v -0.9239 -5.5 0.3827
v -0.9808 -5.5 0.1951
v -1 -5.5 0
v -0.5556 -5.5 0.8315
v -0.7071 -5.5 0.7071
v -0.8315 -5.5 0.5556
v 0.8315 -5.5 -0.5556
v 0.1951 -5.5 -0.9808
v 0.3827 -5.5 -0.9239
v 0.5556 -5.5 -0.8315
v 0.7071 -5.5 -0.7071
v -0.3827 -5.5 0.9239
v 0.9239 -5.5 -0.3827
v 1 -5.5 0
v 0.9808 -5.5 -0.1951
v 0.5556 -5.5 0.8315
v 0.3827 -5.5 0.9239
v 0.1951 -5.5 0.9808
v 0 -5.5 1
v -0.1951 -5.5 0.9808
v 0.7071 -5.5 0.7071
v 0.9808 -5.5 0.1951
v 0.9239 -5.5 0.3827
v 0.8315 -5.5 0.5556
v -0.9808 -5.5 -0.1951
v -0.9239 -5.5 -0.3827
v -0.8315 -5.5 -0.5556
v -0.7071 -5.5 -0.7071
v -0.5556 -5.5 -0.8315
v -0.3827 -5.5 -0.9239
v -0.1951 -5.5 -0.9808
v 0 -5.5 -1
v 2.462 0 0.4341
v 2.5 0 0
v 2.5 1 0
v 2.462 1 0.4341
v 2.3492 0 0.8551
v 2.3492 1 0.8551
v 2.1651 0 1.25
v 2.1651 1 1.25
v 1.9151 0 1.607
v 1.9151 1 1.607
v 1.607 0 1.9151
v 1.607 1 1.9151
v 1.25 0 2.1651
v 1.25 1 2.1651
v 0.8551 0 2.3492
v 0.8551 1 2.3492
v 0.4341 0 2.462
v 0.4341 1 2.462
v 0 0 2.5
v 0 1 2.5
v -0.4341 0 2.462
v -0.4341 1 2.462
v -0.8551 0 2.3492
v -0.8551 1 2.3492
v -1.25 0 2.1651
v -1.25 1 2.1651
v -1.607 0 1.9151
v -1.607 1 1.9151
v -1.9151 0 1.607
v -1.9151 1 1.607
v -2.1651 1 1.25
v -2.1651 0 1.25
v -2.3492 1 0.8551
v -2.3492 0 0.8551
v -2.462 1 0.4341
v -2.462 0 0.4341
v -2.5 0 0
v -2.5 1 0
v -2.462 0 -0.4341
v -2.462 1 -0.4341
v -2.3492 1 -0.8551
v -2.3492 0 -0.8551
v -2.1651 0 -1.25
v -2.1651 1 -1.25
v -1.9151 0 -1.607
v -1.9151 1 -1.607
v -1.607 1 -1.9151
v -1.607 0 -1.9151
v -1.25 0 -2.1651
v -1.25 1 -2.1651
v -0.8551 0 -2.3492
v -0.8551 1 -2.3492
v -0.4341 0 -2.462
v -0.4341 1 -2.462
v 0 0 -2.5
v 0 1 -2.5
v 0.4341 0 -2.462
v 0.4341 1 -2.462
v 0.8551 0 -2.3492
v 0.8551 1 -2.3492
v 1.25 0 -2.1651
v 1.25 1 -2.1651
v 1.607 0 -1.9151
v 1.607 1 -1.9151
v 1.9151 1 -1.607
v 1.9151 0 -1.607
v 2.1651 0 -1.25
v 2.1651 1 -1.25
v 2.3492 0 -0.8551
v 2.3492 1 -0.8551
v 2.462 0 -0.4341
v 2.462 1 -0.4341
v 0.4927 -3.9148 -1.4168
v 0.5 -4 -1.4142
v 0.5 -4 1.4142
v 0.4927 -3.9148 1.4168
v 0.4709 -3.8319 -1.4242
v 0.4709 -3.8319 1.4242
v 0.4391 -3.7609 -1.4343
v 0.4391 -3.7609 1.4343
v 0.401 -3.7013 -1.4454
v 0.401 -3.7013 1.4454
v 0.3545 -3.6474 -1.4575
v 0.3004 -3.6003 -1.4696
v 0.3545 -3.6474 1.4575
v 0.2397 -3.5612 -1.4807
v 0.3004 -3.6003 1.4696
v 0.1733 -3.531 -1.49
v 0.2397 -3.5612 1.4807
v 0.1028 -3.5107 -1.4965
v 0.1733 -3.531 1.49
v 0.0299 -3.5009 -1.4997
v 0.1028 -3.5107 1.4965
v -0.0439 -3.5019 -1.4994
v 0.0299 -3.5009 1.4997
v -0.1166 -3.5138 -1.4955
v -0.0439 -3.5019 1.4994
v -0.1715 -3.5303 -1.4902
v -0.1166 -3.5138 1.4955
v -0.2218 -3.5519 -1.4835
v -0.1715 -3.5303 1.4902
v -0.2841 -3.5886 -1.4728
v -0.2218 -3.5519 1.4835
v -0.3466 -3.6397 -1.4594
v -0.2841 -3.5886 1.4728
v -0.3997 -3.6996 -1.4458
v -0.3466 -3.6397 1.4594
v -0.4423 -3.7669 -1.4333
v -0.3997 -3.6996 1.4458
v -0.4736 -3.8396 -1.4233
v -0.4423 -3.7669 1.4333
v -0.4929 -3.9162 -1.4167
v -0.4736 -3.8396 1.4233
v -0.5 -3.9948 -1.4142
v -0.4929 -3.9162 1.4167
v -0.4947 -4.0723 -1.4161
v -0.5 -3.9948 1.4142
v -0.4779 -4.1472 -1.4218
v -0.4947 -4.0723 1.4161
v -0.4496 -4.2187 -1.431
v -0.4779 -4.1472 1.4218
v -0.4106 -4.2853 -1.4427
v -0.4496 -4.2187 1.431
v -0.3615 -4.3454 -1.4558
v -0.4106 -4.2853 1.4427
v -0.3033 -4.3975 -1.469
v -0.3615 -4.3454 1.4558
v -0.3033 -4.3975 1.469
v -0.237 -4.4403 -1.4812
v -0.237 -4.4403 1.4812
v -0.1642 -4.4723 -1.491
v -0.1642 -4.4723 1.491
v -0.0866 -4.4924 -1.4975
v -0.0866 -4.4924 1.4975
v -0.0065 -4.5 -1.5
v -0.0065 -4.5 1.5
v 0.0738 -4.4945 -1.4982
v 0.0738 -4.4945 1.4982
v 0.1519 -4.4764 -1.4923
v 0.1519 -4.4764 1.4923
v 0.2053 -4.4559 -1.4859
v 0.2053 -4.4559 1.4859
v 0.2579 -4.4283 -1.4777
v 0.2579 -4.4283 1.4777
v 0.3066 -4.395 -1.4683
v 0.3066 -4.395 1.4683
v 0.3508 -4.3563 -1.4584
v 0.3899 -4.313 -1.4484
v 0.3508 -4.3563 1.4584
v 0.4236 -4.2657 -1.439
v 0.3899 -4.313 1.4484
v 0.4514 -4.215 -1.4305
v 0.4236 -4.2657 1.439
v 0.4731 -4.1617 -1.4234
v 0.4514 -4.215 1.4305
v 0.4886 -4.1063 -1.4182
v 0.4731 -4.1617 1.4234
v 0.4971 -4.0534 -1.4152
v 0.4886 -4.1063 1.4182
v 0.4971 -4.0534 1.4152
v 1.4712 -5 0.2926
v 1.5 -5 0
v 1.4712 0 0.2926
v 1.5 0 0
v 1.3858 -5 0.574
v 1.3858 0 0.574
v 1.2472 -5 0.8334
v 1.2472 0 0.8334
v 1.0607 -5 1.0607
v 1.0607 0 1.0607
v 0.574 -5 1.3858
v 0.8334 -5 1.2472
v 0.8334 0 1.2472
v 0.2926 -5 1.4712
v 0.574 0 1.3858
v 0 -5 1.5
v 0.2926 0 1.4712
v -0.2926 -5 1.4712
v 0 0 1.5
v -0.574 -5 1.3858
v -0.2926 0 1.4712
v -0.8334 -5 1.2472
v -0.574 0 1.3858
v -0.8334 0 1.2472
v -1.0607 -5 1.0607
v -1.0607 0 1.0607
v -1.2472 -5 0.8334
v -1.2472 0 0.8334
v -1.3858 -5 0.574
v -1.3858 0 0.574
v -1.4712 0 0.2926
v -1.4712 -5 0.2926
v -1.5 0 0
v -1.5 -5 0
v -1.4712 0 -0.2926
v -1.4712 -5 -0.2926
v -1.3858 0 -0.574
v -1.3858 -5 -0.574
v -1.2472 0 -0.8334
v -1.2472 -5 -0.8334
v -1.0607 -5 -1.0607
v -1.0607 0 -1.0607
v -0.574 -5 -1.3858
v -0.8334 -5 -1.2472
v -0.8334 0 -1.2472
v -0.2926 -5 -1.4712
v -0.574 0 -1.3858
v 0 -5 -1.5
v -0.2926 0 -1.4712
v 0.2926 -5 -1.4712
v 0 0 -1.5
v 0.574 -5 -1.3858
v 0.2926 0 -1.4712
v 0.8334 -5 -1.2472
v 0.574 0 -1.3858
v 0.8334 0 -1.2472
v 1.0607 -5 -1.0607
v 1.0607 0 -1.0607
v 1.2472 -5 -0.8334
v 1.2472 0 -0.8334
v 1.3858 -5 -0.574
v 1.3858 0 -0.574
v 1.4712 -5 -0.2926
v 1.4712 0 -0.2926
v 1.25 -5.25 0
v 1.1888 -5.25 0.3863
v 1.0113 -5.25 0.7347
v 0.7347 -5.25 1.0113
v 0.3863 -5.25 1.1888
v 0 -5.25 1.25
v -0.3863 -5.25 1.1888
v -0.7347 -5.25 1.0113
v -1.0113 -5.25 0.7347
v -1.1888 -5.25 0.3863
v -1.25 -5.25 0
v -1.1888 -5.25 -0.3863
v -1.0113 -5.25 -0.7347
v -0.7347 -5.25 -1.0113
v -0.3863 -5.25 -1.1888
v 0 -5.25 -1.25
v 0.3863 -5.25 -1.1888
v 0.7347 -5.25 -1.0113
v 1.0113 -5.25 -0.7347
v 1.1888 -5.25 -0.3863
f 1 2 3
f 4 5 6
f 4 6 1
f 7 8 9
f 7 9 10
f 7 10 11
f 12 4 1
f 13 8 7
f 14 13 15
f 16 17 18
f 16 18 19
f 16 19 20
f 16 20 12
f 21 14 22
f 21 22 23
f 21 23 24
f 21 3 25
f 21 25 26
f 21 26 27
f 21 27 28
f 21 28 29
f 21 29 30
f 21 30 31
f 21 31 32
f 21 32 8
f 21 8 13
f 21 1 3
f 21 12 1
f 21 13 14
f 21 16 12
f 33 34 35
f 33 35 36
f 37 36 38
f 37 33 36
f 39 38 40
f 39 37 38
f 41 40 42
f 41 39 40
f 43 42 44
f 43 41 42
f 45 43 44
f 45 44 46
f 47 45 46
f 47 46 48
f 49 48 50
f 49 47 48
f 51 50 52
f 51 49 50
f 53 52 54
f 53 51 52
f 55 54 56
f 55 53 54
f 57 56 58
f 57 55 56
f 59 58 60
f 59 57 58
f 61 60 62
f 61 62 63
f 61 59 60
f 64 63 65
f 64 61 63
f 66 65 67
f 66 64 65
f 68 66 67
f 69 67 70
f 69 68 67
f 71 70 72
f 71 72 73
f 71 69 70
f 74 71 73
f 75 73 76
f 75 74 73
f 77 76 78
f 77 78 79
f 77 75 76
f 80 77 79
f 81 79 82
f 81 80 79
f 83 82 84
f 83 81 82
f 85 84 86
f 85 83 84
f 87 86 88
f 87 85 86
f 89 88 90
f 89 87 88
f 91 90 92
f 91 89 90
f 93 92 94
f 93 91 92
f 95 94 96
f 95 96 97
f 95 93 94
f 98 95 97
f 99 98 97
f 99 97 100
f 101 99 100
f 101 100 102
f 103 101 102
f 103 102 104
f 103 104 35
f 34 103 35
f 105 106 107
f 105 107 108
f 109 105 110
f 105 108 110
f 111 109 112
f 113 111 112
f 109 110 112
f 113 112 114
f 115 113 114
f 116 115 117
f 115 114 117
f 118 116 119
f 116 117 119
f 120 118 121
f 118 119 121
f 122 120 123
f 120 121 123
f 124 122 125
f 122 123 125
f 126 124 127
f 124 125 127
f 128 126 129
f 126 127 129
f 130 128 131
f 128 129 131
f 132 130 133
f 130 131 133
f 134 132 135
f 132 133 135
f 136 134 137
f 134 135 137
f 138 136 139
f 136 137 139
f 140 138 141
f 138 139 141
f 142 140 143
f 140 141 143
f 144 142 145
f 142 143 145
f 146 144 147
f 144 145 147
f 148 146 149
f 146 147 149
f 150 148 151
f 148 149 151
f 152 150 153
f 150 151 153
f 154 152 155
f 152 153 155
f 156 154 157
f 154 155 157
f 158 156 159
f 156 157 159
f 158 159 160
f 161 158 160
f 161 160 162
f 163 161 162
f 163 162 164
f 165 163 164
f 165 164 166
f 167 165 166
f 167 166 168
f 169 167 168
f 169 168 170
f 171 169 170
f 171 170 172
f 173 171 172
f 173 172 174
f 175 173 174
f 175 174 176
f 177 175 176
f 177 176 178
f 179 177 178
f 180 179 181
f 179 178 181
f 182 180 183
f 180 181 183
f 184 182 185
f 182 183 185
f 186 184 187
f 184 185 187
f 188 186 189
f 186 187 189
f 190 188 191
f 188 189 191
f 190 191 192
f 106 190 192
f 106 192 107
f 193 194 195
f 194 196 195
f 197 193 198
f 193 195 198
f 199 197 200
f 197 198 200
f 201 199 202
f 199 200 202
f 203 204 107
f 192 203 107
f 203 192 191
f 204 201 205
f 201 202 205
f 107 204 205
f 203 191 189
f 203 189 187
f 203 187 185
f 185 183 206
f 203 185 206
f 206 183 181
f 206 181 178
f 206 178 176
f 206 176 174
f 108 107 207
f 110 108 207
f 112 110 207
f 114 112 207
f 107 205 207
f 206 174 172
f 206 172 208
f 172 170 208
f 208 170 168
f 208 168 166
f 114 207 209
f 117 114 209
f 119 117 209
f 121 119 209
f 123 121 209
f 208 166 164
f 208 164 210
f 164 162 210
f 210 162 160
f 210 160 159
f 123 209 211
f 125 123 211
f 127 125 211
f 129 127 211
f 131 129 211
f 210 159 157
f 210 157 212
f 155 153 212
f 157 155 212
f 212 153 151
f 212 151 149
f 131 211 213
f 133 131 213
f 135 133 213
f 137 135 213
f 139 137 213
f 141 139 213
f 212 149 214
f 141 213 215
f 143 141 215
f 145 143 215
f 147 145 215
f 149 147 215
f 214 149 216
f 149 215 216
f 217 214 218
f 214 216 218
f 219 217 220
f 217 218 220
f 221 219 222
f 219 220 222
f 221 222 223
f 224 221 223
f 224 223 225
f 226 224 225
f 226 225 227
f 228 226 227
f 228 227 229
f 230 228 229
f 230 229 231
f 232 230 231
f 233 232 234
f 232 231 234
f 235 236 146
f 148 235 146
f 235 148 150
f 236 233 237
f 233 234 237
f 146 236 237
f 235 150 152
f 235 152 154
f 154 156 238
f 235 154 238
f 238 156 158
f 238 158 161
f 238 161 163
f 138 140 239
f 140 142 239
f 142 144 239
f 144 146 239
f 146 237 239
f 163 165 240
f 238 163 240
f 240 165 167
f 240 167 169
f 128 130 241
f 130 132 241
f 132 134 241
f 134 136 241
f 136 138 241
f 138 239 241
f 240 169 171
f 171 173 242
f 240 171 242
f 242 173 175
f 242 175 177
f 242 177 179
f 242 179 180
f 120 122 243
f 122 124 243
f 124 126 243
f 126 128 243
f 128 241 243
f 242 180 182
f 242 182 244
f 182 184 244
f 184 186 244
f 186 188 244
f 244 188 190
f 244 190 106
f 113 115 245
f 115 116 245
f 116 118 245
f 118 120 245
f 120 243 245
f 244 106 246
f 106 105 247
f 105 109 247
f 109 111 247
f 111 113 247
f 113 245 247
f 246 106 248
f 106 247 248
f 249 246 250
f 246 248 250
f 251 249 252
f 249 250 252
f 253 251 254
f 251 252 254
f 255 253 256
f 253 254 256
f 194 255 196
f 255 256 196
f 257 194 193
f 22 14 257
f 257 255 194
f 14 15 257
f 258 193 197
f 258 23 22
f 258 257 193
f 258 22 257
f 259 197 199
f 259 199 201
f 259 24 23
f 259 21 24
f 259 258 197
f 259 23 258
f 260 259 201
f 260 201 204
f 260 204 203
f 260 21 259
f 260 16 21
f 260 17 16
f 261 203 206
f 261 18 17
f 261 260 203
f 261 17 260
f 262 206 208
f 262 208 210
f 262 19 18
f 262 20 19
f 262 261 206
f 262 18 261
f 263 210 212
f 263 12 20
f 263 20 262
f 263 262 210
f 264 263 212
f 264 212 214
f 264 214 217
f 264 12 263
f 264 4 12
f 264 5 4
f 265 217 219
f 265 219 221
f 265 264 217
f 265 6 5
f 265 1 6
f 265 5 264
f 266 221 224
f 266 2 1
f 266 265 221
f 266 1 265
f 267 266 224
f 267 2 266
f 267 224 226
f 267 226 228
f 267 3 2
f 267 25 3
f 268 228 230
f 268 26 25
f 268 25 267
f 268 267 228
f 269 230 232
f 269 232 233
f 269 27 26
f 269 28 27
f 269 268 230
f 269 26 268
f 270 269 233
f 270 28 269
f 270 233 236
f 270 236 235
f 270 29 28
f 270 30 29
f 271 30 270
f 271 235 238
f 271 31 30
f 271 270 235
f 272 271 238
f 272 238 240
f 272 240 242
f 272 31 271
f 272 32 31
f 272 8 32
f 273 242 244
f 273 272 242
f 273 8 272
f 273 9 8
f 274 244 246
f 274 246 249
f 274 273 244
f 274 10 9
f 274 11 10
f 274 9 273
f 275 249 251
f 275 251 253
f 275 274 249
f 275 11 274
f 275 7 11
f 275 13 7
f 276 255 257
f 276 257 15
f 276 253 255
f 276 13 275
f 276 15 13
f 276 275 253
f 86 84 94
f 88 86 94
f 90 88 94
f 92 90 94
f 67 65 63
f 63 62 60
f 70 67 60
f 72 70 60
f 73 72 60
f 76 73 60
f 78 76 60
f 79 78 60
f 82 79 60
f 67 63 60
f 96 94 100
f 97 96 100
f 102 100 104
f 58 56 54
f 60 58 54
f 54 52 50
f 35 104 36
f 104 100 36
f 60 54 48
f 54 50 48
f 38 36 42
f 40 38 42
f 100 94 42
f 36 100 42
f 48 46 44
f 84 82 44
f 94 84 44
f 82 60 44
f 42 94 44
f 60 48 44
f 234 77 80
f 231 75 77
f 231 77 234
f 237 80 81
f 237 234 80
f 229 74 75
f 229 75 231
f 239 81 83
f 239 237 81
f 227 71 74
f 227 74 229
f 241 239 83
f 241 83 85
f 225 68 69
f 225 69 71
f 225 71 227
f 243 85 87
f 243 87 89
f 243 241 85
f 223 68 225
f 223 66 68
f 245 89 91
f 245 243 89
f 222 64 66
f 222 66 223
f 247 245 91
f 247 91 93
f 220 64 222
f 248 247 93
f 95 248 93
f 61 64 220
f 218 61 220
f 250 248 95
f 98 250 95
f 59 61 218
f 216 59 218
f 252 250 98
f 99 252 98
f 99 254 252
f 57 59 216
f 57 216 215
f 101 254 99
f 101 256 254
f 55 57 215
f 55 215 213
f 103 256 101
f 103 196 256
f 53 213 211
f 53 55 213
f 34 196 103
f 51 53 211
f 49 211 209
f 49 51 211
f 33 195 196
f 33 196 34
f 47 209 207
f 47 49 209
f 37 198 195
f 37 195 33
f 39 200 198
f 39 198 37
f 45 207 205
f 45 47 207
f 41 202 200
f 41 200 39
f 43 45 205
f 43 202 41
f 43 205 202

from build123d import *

# Parameters (mm, degrees)
F0_R     = 1.5
F1_DEPTH = 5.5
F0_R_2   = 2.5
F2_DEPTH = 1
F3_SIZE  = 0.5
F4_R     = 0.5
F5_DEPTH = 12.5


with BuildPart() as f1:
    # F0 (on Front) → F1 (new body)
    with BuildSketch(Plane.XZ):
        Circle(F0_R)
    extrude(amount=F1_DEPTH)

    # F0 (on Front) → F2 (join)
    with BuildSketch(Plane.XZ):
        Circle(F0_R_2)
        Circle(F0_R, mode=Mode.SUBTRACT)
        Circle(F0_R)
    extrude(amount=-F2_DEPTH)

    # F3
    f3_edges = [f1.edges().sort_by_distance(p)[0] for p in [
        (-1.5, -5.5, 0),
    ]]
    chamfer(f3_edges, length=F3_SIZE)

    # F4 (on Top) → F5 (cut, symmetric)
    with BuildSketch(Plane.XY):
        with Locations((0, -4)):
            Circle(F4_R)
    extrude(amount=F5_DEPTH, both=True, mode=Mode.SUBTRACT)


solid = f1.part
